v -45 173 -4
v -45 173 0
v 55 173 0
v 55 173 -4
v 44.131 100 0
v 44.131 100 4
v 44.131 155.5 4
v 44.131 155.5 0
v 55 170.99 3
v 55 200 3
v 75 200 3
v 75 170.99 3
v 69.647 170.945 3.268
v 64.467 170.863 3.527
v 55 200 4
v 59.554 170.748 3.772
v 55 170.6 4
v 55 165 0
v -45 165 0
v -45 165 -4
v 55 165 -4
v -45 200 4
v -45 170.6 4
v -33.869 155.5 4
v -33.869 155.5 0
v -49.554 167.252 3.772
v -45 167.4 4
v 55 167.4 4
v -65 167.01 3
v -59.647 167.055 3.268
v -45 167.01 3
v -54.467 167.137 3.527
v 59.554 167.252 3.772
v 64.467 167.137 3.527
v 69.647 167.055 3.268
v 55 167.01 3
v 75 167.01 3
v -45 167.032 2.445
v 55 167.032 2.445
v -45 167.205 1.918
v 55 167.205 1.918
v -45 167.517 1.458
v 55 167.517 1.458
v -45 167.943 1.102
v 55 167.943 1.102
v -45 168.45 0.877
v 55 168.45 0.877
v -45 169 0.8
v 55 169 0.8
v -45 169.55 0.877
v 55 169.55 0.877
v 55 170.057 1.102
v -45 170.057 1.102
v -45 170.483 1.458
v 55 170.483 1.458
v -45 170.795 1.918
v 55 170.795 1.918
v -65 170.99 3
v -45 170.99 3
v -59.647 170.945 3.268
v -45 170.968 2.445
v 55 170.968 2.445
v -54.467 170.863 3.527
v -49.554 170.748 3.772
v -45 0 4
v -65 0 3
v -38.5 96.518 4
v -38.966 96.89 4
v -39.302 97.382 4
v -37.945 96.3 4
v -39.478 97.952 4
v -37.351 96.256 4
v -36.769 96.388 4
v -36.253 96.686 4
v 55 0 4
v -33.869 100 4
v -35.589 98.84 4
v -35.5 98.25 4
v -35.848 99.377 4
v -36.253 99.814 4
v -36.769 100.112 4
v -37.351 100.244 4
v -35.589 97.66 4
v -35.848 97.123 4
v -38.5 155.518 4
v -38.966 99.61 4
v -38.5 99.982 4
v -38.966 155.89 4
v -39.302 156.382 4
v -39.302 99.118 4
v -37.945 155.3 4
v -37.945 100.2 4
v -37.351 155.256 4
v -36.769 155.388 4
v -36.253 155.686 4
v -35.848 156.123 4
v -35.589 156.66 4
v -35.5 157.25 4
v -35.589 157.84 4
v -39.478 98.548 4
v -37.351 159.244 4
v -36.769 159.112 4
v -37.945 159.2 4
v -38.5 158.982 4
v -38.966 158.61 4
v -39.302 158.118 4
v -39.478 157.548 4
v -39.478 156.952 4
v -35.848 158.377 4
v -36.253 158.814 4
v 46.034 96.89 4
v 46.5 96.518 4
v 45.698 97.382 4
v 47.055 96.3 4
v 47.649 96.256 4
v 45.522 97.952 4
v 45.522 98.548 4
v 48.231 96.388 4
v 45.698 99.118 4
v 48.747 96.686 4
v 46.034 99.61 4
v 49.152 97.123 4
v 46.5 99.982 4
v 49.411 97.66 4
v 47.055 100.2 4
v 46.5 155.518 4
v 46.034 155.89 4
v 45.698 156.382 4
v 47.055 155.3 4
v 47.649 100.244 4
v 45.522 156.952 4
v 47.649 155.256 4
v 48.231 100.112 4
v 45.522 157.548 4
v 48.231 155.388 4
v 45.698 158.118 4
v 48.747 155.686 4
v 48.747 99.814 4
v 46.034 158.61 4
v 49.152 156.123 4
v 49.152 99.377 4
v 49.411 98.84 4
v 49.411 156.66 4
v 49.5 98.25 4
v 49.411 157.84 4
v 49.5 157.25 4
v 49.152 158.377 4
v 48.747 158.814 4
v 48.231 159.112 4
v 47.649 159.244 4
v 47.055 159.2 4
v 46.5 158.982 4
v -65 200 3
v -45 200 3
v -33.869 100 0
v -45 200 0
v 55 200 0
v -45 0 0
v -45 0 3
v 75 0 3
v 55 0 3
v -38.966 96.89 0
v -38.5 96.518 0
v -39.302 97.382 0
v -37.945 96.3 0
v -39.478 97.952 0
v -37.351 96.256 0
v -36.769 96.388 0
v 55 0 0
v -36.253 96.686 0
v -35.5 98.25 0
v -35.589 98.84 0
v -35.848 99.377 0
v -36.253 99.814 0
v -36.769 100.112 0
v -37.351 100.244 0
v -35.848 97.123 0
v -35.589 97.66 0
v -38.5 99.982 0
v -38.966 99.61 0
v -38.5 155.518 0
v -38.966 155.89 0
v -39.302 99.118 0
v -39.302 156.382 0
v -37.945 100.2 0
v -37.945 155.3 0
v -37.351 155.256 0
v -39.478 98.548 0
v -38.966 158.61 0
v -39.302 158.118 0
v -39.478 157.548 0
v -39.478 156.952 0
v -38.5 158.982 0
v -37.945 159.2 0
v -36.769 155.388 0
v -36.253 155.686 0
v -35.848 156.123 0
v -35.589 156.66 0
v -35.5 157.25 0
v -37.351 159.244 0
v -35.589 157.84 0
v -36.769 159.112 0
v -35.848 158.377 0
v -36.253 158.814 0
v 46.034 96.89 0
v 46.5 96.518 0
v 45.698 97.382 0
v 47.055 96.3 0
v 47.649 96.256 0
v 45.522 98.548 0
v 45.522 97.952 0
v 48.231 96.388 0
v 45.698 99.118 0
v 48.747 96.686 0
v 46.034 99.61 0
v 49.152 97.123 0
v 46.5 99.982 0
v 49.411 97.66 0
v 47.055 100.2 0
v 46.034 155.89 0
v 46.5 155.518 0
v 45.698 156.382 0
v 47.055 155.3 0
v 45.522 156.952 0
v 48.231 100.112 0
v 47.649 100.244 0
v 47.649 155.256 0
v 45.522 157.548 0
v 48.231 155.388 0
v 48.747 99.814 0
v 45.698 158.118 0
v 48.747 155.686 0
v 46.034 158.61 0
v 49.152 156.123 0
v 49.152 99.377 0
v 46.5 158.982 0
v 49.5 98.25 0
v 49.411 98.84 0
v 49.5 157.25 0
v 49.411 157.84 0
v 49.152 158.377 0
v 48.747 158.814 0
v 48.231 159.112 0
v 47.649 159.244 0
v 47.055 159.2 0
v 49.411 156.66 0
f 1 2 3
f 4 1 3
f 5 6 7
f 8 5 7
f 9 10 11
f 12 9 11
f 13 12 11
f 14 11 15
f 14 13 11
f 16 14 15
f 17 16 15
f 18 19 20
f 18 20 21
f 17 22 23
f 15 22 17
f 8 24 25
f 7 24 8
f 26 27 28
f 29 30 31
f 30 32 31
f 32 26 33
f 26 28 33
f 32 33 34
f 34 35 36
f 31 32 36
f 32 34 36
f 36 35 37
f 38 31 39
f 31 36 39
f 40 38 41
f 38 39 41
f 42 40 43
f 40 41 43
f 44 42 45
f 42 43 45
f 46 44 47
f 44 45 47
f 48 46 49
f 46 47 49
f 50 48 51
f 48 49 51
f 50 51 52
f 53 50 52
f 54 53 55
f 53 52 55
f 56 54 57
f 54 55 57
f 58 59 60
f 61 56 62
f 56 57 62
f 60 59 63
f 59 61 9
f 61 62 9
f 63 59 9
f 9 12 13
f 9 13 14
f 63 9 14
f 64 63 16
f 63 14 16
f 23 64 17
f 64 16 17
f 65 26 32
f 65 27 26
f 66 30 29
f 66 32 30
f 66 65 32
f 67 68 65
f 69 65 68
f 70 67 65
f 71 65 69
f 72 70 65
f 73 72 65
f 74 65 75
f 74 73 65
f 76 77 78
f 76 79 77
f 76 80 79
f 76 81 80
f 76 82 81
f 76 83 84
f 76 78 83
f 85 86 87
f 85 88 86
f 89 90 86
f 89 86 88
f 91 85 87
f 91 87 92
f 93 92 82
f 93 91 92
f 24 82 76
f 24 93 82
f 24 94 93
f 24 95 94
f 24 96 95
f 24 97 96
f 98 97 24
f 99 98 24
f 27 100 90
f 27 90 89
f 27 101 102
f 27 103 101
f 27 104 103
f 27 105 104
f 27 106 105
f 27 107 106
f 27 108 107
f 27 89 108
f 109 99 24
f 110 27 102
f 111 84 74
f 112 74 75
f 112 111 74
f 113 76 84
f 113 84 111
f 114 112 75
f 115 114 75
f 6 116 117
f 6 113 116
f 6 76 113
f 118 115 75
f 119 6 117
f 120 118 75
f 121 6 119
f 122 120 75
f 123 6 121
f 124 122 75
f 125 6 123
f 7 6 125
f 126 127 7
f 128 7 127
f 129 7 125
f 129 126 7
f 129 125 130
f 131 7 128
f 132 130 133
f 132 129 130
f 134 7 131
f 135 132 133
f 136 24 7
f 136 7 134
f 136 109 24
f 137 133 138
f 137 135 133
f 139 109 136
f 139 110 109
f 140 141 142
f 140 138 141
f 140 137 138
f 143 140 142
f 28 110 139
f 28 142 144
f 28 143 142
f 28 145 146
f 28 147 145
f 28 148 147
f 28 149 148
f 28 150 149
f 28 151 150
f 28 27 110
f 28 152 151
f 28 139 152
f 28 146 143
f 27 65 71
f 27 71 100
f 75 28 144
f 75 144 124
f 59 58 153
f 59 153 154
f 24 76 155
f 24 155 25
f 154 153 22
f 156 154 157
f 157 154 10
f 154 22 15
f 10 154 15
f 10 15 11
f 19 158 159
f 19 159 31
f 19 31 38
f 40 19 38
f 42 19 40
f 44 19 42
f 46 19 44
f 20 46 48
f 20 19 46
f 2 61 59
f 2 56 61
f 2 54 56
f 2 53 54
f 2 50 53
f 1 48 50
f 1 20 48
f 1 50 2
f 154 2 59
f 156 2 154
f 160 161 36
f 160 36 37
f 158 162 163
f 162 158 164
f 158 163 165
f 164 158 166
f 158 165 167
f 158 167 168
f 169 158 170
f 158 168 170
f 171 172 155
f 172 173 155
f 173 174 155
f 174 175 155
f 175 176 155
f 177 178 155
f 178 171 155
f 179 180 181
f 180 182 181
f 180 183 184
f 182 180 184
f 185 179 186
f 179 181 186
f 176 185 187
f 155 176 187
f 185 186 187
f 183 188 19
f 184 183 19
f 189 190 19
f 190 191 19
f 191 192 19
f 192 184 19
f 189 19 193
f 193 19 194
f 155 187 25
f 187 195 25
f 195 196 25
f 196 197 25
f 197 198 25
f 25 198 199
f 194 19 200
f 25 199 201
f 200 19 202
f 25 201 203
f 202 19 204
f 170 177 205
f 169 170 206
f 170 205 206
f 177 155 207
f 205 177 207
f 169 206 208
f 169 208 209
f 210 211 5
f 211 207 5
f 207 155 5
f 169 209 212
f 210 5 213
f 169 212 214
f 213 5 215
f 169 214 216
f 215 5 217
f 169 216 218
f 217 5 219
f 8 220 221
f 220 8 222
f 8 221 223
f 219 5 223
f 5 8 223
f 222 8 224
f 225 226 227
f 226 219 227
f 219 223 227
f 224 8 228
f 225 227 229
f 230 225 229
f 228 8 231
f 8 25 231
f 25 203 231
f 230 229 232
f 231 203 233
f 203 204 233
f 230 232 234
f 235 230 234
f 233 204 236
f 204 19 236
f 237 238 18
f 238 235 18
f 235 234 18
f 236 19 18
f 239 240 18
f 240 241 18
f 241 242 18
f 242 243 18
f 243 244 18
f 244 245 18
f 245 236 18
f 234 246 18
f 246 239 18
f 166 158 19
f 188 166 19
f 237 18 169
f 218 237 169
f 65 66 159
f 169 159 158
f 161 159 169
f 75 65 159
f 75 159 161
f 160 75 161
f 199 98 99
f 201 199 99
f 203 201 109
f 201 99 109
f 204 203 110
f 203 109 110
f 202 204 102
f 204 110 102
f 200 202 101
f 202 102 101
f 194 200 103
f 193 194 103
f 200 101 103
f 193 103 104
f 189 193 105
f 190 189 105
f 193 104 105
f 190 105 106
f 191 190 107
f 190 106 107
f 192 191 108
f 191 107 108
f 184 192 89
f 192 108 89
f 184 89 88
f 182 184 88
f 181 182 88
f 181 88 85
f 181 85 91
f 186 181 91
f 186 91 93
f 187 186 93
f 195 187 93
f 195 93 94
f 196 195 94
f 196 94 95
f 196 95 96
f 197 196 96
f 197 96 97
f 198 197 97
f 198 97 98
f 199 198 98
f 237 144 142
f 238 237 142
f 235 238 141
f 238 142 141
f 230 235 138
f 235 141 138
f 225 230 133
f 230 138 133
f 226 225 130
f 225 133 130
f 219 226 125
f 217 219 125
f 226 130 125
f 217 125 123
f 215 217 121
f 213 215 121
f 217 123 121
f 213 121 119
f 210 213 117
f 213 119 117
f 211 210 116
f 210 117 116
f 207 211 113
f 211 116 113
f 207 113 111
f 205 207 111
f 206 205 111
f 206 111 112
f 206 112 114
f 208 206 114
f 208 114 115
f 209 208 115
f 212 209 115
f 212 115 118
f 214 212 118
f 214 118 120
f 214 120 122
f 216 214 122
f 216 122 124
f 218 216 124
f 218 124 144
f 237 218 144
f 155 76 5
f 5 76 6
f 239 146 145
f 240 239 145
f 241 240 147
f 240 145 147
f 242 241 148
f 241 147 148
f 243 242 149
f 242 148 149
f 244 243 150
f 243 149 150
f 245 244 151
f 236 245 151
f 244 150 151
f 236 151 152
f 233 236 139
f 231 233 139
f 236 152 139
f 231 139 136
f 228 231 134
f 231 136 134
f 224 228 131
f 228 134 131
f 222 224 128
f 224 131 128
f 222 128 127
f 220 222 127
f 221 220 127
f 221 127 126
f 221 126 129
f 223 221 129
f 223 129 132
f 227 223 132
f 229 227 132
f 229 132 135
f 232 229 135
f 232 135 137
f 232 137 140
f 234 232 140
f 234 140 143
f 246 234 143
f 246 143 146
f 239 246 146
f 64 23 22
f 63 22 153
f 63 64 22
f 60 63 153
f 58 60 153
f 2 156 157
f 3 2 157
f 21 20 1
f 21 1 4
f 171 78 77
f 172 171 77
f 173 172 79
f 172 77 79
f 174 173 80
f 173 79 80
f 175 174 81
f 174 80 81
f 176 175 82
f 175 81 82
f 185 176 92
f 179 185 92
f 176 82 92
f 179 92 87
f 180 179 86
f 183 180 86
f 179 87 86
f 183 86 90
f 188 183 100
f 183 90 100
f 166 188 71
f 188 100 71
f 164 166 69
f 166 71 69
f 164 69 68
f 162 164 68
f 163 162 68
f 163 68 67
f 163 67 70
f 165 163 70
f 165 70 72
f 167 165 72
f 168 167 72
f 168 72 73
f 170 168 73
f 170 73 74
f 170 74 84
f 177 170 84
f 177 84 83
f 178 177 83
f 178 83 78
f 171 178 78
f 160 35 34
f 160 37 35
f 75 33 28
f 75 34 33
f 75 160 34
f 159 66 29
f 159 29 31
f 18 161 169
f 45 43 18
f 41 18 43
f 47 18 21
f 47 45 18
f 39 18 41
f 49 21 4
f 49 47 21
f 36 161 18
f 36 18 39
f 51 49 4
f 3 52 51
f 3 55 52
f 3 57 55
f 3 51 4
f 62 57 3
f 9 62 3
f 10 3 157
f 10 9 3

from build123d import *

# Parameters (mm, degrees)
F0_W          = 100
F0_H          = 200
F1_DEPTH      = 4
F2_W          = 78
F2_H          = 55.5
F2_R          = 2
F3_DEPTH      = 25
F5_DEPTH      = 200
F6_W          = 100
F6_H          = 8
F7_DEPTH      = 4
F8_R          = 2
F9_DEPTH      = 200
F9_DEPTH_BACK = 200


with BuildPart() as f1:
    # F0 (on Top) → F1 (new body)
    with BuildSketch(Plane.XY):
        with Locations((4.999995, 100)):
            Rectangle(F0_W, F0_H)
    extrude(amount=F1_DEPTH)

    # F2 (on face) → F3 (cut)
    with BuildSketch(Plane.XY.offset(4)):
        with Locations((5.131312, 127.75)):
            Rectangle(F2_W, F2_H)
        with Locations((-37.500005, 98.25)):
            Circle(F2_R)
        with Locations((-37.500005, 157.25)):
            Circle(F2_R)
        with Locations((47.499995, 157.25)):
            Circle(F2_R)
        with Locations((47.499995, 98.25)):
            Circle(F2_R)
    extrude(amount=-F3_DEPTH, mode=Mode.SUBTRACT)

    # F4 (on face) → F5 (join)
    with BuildSketch(Plane.XZ):
        Polygon((-45.000005, 3), (-45.000005, 4), (-65.000005, 3), align=None)
        Polygon((74.999995, 3), (54.999995, 4), (54.999995, 3), align=None)
    extrude(amount=-F5_DEPTH)

    # F6 (on face) → F7 (join)
    with BuildSketch(Plane(origin=(0, 0, 0), x_dir=(1, 0, 0), z_dir=(0, 0, -1))):
        with Locations((4.999995, -169)):
            Rectangle(F6_W, F6_H)
    extrude(amount=F7_DEPTH)

    # F8 (on face) → F9 (cut, two sides)
    with BuildSketch(Plane.YZ.offset(54.999995)) as f9_sk:
        with Locations((169, 2.8)):
            Circle(F8_R)
    extrude(amount=F9_DEPTH, mode=Mode.SUBTRACT)
    extrude(f9_sk.sketch, amount=-F9_DEPTH_BACK, mode=Mode.SUBTRACT)


solid = f1.part
